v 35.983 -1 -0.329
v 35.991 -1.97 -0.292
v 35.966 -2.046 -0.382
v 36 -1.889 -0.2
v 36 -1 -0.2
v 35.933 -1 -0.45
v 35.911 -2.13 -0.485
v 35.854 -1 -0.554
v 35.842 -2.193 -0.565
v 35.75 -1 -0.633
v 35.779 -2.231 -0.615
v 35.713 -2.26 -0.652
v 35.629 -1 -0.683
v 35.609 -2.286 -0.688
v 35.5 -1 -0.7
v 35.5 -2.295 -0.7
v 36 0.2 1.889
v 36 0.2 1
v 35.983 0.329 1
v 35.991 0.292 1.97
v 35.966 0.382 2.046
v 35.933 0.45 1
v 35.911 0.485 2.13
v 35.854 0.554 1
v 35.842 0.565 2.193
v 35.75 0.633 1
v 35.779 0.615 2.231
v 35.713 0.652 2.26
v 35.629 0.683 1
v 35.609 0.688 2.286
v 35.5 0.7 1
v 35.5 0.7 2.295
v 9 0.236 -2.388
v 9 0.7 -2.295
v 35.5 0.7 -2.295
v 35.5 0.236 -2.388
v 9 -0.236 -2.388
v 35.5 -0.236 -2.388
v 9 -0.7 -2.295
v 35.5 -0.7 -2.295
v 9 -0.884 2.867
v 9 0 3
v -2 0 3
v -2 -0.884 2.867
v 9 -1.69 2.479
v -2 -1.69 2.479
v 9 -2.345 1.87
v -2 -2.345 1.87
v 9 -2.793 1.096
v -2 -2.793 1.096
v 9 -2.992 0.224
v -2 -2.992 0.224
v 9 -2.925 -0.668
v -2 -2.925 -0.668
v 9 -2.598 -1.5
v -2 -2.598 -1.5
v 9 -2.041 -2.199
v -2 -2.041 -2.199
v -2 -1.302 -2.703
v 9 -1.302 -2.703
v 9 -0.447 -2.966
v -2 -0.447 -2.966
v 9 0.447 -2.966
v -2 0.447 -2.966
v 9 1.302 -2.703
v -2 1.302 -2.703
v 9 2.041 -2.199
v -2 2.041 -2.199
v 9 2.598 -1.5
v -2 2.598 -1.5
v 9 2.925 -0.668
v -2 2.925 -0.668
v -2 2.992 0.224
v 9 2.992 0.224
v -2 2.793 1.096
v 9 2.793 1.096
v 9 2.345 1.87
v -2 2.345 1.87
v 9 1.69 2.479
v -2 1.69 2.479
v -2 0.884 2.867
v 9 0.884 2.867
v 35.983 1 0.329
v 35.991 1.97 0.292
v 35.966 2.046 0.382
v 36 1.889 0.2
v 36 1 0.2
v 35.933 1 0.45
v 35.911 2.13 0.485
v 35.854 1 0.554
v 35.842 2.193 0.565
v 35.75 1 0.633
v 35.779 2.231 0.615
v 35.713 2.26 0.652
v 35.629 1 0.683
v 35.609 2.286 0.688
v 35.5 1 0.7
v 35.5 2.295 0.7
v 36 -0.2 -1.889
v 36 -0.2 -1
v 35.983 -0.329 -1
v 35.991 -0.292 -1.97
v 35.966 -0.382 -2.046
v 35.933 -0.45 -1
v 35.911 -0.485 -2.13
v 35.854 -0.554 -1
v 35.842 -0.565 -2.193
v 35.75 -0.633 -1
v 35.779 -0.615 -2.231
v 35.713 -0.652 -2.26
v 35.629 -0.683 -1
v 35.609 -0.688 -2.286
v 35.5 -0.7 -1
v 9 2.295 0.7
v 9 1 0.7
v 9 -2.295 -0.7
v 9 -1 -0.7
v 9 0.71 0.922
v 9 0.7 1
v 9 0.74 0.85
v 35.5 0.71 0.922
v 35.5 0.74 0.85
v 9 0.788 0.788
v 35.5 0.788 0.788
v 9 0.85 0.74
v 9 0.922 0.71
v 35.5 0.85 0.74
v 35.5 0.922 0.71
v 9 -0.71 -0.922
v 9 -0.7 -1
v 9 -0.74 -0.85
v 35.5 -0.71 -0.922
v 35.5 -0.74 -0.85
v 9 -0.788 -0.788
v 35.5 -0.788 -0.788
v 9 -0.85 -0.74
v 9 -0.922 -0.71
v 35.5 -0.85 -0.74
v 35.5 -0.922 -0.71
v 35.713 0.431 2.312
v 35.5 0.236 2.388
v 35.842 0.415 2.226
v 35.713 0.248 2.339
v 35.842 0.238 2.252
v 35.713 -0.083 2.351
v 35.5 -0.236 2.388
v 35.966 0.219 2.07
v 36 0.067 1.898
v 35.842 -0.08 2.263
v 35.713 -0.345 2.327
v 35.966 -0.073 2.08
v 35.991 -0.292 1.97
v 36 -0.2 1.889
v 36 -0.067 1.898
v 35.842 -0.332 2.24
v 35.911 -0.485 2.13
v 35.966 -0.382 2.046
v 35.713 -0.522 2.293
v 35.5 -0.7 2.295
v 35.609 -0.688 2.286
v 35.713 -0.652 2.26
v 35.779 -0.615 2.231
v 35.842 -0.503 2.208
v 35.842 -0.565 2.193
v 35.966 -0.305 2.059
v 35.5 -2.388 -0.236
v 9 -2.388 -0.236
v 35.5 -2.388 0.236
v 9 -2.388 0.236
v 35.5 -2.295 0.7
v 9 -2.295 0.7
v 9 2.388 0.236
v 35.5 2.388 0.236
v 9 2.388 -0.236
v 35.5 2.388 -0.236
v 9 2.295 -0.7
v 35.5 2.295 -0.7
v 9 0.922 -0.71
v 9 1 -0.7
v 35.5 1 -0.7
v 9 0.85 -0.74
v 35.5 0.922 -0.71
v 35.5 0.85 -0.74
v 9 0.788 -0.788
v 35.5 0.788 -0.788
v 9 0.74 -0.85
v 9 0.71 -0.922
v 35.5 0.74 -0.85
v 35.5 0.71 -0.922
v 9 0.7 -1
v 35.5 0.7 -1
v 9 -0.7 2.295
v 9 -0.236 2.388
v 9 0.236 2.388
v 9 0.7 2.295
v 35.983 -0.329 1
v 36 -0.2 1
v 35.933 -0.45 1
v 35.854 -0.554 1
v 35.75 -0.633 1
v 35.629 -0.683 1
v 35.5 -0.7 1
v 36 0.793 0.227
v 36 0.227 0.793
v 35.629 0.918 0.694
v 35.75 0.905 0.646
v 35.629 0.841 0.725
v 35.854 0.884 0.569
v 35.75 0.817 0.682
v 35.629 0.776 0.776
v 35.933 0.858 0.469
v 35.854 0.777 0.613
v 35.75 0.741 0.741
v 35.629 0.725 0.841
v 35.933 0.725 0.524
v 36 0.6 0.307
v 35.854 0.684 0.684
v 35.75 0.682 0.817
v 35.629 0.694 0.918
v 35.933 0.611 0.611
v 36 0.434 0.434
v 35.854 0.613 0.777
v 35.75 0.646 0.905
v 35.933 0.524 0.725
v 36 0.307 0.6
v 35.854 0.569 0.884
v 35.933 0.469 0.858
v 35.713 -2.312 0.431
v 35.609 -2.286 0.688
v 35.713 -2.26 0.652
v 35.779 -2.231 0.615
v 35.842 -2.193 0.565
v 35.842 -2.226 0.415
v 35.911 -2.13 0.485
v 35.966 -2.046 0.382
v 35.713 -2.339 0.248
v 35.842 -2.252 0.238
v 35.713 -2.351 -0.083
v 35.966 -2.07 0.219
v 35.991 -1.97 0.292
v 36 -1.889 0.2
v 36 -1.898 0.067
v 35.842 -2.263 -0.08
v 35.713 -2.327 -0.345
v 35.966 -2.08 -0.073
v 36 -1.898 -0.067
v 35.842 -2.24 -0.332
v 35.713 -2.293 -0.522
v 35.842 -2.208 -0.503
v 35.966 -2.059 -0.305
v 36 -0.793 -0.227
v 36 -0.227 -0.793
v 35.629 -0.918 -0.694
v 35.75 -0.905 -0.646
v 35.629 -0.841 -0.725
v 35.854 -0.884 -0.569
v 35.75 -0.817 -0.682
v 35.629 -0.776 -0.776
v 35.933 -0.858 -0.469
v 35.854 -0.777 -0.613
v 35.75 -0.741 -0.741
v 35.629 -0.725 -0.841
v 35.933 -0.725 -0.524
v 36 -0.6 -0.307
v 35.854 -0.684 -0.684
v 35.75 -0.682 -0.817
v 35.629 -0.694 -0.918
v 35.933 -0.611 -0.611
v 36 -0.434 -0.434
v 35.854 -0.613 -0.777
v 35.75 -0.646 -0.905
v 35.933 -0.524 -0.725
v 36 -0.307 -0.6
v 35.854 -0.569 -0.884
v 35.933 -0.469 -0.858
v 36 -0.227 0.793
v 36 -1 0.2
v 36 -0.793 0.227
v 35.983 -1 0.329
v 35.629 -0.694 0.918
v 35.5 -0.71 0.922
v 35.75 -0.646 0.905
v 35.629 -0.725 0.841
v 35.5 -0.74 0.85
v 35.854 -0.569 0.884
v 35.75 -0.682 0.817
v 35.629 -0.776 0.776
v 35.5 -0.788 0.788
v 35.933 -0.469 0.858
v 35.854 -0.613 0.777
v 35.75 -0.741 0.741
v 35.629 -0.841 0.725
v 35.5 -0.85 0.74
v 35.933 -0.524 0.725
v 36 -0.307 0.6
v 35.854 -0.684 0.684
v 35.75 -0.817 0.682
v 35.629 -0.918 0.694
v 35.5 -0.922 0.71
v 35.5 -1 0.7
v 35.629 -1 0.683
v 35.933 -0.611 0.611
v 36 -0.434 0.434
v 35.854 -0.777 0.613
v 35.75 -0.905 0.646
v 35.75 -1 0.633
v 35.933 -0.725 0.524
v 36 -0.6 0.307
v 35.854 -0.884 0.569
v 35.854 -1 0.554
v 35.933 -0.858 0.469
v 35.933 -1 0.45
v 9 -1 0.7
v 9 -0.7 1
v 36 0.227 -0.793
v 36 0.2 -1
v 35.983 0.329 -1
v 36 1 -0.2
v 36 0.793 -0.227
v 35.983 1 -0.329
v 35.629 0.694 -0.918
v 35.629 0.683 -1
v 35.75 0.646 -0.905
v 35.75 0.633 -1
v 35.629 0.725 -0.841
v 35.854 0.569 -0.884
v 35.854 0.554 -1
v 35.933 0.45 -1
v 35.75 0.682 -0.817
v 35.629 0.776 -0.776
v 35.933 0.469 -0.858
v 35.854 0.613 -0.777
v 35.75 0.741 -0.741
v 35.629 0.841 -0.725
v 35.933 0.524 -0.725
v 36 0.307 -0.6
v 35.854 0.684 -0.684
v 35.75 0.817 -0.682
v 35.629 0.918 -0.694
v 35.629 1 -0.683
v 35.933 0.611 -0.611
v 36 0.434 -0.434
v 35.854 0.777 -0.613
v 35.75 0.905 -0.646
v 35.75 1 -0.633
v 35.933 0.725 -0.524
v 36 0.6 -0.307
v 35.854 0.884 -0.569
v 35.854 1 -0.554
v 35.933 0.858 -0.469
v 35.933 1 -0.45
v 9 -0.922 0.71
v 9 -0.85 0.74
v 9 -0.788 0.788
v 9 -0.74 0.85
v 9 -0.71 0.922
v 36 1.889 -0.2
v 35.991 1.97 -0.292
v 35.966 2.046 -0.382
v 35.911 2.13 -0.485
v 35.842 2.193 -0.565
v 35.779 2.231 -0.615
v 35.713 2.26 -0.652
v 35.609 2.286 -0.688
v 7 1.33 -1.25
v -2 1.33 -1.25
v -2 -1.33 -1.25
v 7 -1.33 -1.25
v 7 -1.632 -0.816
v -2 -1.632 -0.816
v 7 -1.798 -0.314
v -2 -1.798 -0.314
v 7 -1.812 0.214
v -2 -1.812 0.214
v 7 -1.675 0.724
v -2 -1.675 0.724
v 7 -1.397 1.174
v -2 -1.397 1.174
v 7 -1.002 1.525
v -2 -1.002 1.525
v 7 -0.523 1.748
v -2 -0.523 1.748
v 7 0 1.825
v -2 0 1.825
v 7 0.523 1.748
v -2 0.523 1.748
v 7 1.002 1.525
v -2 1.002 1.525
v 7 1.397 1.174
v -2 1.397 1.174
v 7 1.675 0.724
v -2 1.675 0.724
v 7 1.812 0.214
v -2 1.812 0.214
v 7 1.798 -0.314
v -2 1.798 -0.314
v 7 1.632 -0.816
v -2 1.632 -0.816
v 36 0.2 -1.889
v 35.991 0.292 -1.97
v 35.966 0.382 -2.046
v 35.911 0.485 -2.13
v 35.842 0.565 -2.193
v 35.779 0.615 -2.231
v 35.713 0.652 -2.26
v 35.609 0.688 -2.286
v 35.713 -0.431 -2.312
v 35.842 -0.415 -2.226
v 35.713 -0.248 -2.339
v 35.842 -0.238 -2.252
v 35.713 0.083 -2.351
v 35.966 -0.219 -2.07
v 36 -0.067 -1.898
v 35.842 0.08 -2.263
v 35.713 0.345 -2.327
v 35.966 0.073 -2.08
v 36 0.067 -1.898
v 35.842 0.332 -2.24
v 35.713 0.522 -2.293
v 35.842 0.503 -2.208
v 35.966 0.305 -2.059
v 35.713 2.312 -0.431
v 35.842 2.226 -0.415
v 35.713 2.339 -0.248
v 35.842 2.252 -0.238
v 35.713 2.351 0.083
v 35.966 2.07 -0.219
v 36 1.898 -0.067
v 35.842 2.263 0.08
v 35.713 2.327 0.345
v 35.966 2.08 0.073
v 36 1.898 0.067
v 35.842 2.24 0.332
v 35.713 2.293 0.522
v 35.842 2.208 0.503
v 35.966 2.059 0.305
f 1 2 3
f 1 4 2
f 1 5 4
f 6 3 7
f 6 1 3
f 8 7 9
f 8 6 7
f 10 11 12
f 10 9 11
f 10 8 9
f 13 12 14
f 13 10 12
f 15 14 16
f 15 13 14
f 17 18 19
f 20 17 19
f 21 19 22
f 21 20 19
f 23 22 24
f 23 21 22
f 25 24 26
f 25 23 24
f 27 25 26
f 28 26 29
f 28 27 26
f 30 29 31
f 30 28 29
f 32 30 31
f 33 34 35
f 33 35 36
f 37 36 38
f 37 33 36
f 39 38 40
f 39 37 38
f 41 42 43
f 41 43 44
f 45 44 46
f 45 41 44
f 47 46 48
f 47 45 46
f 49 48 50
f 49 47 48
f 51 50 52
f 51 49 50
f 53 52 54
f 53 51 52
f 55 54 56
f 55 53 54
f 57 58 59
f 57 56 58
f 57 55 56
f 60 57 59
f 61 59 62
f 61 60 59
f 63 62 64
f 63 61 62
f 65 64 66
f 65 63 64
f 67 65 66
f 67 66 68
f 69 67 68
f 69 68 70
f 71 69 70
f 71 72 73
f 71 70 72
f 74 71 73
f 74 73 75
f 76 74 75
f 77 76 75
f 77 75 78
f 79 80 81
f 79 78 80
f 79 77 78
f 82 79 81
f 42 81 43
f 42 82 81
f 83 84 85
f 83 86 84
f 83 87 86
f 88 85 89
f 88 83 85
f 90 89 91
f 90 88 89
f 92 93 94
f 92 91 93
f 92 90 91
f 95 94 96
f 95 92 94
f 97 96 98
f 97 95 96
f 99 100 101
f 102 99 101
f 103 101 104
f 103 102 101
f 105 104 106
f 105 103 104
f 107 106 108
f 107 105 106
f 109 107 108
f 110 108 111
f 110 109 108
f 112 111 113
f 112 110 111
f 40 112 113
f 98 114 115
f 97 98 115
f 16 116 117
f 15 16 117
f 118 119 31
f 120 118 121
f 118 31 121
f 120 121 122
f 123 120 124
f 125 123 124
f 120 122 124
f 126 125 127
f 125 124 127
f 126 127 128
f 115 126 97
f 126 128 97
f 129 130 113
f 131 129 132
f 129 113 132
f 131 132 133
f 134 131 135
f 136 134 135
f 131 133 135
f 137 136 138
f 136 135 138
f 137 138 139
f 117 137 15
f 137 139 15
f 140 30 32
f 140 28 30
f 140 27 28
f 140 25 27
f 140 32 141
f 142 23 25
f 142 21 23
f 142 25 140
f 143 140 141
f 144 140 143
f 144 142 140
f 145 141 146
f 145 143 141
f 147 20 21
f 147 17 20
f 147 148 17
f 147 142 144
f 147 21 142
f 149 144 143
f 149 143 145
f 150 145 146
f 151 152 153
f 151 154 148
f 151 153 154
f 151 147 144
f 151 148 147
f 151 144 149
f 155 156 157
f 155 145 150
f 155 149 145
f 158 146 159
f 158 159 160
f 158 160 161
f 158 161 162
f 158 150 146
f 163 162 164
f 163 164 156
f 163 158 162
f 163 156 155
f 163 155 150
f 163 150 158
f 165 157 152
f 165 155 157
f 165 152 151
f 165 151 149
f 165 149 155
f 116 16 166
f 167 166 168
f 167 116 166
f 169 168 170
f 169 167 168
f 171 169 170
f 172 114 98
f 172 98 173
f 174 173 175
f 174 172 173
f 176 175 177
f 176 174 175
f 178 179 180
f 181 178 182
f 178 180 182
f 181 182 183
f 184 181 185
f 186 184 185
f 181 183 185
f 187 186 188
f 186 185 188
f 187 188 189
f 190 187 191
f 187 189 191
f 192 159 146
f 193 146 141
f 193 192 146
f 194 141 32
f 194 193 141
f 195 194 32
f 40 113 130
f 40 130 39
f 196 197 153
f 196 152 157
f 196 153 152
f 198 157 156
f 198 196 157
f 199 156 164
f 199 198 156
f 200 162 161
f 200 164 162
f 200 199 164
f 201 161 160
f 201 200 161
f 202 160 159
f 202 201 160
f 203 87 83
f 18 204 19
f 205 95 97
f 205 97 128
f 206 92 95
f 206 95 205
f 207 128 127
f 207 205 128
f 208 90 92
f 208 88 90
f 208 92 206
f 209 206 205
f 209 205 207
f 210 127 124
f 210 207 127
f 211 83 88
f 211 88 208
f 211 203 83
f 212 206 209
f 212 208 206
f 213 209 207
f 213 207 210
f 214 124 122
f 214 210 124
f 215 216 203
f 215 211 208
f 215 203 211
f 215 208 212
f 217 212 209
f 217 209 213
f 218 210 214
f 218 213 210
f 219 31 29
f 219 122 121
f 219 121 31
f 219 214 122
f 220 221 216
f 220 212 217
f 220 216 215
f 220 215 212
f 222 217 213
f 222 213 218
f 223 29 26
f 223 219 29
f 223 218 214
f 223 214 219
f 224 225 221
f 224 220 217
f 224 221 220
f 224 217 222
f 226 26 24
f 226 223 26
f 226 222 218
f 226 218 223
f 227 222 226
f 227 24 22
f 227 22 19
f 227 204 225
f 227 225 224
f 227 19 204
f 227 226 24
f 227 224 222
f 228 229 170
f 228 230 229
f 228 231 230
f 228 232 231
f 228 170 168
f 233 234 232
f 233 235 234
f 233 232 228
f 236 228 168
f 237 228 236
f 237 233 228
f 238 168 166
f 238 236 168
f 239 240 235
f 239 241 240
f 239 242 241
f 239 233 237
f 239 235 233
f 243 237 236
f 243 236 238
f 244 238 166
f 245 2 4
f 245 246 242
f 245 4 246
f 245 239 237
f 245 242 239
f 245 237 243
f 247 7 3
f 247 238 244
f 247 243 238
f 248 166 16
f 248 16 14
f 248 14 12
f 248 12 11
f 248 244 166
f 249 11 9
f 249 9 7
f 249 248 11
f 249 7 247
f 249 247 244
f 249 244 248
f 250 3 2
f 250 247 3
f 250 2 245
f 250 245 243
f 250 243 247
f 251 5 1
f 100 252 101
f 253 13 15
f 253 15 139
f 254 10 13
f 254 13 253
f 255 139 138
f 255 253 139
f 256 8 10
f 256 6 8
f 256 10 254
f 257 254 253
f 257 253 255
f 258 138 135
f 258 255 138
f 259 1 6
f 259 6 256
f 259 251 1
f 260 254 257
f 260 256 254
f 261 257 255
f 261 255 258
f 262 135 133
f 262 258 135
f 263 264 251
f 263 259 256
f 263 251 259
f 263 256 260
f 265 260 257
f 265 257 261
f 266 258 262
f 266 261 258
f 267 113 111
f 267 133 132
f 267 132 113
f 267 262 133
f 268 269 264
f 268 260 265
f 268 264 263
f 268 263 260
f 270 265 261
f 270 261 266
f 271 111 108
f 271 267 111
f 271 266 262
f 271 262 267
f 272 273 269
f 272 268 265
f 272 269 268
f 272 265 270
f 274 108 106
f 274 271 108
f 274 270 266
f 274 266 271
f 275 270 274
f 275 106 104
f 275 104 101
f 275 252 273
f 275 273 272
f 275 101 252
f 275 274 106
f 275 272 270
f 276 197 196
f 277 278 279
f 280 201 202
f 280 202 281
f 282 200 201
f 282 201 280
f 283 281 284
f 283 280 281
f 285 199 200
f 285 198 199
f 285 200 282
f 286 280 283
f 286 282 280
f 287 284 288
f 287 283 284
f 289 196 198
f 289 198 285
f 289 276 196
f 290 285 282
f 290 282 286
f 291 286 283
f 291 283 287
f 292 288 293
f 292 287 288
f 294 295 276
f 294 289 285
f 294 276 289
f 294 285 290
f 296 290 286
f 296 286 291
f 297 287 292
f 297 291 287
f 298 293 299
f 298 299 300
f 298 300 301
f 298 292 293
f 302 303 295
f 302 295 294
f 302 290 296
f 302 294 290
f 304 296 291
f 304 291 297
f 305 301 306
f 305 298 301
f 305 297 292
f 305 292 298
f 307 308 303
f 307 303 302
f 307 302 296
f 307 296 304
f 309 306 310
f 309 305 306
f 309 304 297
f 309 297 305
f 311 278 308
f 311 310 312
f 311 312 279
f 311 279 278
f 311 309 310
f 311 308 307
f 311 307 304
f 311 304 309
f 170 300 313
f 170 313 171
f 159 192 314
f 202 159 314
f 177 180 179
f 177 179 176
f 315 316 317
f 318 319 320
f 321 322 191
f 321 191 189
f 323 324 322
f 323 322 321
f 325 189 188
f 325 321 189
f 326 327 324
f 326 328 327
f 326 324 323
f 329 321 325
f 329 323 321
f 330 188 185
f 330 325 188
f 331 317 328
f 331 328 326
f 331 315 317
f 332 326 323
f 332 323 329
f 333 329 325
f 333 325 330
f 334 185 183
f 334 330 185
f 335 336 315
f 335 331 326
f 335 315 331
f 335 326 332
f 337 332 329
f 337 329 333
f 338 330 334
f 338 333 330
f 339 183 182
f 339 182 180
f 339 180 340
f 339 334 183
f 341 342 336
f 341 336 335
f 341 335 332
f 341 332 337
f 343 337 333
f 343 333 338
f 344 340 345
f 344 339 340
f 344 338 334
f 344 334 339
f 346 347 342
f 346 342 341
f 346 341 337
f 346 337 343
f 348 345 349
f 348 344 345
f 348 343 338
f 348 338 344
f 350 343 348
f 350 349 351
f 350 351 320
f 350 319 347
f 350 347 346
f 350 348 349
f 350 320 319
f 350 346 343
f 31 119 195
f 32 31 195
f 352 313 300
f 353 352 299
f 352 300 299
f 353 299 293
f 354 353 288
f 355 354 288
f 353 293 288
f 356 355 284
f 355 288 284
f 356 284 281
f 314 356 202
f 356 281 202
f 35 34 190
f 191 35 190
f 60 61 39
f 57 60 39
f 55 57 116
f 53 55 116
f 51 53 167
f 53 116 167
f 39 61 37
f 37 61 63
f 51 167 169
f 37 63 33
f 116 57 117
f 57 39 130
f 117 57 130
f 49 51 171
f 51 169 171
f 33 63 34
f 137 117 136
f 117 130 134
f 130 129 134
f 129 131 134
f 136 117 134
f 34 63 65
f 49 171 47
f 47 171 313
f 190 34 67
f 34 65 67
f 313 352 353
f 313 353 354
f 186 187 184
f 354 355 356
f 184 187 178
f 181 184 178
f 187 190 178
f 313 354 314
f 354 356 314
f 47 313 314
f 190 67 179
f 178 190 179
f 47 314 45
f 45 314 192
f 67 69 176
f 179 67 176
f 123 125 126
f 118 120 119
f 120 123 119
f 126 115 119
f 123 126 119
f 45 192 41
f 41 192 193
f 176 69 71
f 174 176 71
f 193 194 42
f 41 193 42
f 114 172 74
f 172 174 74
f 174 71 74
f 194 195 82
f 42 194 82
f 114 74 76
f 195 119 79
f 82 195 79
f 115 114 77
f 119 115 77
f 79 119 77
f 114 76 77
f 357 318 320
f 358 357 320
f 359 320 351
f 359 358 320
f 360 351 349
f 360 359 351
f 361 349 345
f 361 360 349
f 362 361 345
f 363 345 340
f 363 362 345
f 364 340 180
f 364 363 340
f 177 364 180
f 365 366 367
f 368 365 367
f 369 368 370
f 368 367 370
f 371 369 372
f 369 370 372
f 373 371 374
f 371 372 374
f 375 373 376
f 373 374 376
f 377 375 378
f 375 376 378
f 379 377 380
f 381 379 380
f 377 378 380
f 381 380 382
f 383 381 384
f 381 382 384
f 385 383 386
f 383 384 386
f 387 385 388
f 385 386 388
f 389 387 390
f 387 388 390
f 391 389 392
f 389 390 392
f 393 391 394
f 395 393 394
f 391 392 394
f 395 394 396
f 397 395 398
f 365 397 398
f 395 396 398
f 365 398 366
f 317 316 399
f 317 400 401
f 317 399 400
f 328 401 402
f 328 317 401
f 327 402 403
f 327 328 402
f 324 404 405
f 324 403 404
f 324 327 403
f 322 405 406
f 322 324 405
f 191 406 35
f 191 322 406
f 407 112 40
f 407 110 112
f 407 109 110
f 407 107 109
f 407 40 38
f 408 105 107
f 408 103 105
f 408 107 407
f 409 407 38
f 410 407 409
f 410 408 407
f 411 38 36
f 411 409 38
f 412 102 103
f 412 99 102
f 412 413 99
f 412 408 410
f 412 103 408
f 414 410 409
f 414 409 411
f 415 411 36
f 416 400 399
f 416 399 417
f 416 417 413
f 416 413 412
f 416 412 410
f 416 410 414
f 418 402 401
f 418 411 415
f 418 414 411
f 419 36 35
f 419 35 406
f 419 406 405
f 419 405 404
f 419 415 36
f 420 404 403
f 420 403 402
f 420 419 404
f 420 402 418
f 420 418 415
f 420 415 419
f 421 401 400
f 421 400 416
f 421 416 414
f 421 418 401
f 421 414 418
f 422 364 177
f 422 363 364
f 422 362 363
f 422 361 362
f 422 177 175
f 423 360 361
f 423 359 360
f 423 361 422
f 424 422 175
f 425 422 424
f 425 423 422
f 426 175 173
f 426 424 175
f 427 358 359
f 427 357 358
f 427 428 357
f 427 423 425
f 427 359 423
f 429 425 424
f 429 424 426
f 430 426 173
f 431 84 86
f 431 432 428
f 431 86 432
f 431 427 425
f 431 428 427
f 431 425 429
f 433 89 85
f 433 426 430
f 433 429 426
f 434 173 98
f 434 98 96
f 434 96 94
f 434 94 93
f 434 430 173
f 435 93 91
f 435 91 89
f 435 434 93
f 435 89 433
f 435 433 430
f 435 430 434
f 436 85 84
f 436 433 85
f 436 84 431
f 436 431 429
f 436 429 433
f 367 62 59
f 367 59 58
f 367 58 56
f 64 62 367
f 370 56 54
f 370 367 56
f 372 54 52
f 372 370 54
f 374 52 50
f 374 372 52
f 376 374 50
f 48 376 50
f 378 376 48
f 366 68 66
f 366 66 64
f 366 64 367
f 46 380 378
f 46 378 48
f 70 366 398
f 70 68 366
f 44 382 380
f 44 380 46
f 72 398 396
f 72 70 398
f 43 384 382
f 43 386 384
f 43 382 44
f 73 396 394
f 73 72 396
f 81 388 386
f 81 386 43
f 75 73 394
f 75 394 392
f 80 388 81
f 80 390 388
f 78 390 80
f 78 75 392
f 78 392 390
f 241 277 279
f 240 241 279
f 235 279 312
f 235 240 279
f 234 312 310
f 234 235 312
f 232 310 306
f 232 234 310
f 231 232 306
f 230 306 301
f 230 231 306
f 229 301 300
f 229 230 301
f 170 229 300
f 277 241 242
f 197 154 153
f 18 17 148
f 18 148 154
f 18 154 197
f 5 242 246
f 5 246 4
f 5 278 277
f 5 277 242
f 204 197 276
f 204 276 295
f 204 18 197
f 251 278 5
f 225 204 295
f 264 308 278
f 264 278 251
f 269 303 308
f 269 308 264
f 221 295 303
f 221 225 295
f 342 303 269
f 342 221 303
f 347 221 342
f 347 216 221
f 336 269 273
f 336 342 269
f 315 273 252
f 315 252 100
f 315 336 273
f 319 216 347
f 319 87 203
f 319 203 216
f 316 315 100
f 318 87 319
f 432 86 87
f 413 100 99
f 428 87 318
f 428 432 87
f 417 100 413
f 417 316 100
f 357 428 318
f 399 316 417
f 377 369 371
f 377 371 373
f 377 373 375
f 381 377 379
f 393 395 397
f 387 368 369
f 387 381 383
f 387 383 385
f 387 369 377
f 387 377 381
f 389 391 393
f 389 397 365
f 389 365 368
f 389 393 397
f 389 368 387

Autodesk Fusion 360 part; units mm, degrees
sketch "Sketch1" plane through (0, 0, 0) normal (1, 0, 0) x (0, 0, -1)
  circle A0 centre (0, 0) radius 2.3995
  dimension "d1" = 4.799
extrude "Extrude1" add sketch "Sketch1" along normal blind 36
sketch "Sketch2" plane through (36, 0, 0) normal (1, 0, 0) x (0, 0, -1)
  circle A0 centre (0, 0) radius 2.3995
  line L0 (0.7, 2.3995) -> (-0.7, 2.3995)
  line L1 (-0.7, -2.3995) -> (0.7, -2.3995)
  line L2 (0.7, 2.3995) -> (-0.7, -2.3995) construction
  line L3 (-0.7, 2.3995) -> (0.7, -2.3995) construction
  line L4 (-2.3995, 0.7) -> (-2.3995, -0.7)
  line L5 (2.3995, -0.7) -> (2.3995, 0.7)
  line L6 (2.3995, 0.7) -> (-2.3995, -0.7) construction
  line L7 (-2.3995, 0.7) -> (2.3995, -0.7) construction
  line L8 (-0.7, 2.3995) -> (-0.7, 1)
  line L9 (-0.7, -1) -> (-0.7, -2.3995)
  line L10 (-2.3995, -0.7) -> (-1, -0.7)
  line L11 (1, -0.7) -> (2.3995, -0.7)
  line L12 (0.7, -2.3995) -> (0.7, -1)
  line L13 (0.7, 1) -> (0.7, 2.3995)
  line L14 (2.3995, 0.7) -> (1, 0.7)
  line L15 (-1, 0.7) -> (-2.3995, 0.7)
  arc A1 (-1, 0.7) -> (-0.7, 1) centre (-1, 1) ccw
  arc A2 (0.7, 1) -> (1, 0.7) centre (1, 1) ccw
  arc A3 (1, -0.7) -> (0.7, -1) centre (1, -1) ccw
  arc A4 (-0.7, -1) -> (-1, -0.7) centre (-1, -1) ccw
  dimension "d4" = 4.799
  dimension "d5" = 1.4
  dimension "d6" = 4.799
  dimension "d7" = 1.4
  dimension "d8" = 0.3
  dimension "d11" = 0.3
extrude "Extrude2" cut sketch "Sketch2" against normal blind 27 contours A0 L13 L14 A2 | A0 L11 L12 A3 | A0 L8 L15 A1 | A0 L9 L10 A4
sketch "Sketch4" plane through (0, 0, 0) normal (-1, 0, 0) x (0, 0, 1)
  circle A0 centre (0, 0) radius 2.3995
  circle A1 centre (0, 0) radius 2.3995
  arc A2 (2.2951, 0.7) -> (0.7, 2.2951) centre (0, 0) ccw
extrude "Extrude4" cut sketch "Sketch4" against normal blind 9
sketch "Sketch5" plane through (9, 0, 0) normal (-1, 0, 0) x (0, 0, 1)
  line L0 (-2.2951, -0.7) -> (-1, -0.7)
  arc A0 (-0.7, -1) -> (-1, -0.7) centre (-1, -1) ccw
  line L1 (-0.7, -1) -> (-0.7, -2.2951)
  arc A1 (-0.7, -2.2951) -> (0.7, -2.2951) centre (0, 0) ccw
  line L2 (0.7, -2.2951) -> (0.7, -1)
  arc A2 (1, -0.7) -> (0.7, -1) centre (1, -1) ccw
  line L3 (1, -0.7) -> (2.2951, -0.7)
  arc A3 (2.2951, -0.7) -> (2.2951, 0.7) centre (0, 0) ccw
  line L4 (2.2951, 0.7) -> (1, 0.7)
  arc A4 (0.7, 1) -> (1, 0.7) centre (1, 1) ccw
  line L5 (0.7, 1) -> (0.7, 2.2951)
  arc A5 (0.7, 2.2951) -> (-0.7, 2.2951) centre (0, 0) ccw
  line L6 (-0.7, 2.2951) -> (-0.7, 1)
  arc A6 (-1, 0.7) -> (-0.7, 1) centre (-1, 1) ccw
  line L7 (-1, 0.7) -> (-2.2951, 0.7)
  arc A7 (-2.2951, 0.7) -> (-2.2951, -0.7) centre (0, 0) ccw
  circle A8 centre (0, 0) radius 3
  dimension "d19" = 6
extrude "Extrude5" add sketch "Sketch5" along normal blind 11 contours L0 A0 L1 A1 L2 A2 L3 A3 L4 A4 L5 A5 L6 A6 L7 A7 | A8
sketch "Sketch6" plane through (-2, 0, 0) normal (-1, 0, 0) x (0, 0, 1)
  circle A0 centre (0, 0) radius 3
  line L0 (-1.25, 0) -> (-1.25, 1.3297)
  line L1 (-2.2951, 0.7) -> (-1, 0.7)
  line L2 (-1.25, 1.3297) -> (-1.25, -1.3297)
  arc A1 (-1.25, -1.3297) -> (-1.25, 1.3297) centre (0, 0) ccw
  point P0 (-0.7, -2.2951)
  dimension "d22" = 3.65
  dimension "d23" = 1.25
extrude "Extrude6" cut sketch "Sketch6" against normal blind 9 contours L0 L2 A1
fillet "Fillet3" radius 0.5 16 edges at (36, 2.3995, 0) (36, 0.7, -1.6476) (36, 0.7879, -0.7879) (36, 1.6476, -0.7) (36, 1.6476, 0.7) (36, 0.7879, 0.7879) (36, 0.7, 1.6476) (36, 0, 2.3995) (36, -0.7, 1.6476) (36, -0.7879, 0.7879) (36, -1.6476, 0.7) (36, -2.3995, 0) (36, -1.6476, -0.7) (36, -0.7879, -0.7879) (36, -0.7, -1.6476) (36, 0, -2.3995)
